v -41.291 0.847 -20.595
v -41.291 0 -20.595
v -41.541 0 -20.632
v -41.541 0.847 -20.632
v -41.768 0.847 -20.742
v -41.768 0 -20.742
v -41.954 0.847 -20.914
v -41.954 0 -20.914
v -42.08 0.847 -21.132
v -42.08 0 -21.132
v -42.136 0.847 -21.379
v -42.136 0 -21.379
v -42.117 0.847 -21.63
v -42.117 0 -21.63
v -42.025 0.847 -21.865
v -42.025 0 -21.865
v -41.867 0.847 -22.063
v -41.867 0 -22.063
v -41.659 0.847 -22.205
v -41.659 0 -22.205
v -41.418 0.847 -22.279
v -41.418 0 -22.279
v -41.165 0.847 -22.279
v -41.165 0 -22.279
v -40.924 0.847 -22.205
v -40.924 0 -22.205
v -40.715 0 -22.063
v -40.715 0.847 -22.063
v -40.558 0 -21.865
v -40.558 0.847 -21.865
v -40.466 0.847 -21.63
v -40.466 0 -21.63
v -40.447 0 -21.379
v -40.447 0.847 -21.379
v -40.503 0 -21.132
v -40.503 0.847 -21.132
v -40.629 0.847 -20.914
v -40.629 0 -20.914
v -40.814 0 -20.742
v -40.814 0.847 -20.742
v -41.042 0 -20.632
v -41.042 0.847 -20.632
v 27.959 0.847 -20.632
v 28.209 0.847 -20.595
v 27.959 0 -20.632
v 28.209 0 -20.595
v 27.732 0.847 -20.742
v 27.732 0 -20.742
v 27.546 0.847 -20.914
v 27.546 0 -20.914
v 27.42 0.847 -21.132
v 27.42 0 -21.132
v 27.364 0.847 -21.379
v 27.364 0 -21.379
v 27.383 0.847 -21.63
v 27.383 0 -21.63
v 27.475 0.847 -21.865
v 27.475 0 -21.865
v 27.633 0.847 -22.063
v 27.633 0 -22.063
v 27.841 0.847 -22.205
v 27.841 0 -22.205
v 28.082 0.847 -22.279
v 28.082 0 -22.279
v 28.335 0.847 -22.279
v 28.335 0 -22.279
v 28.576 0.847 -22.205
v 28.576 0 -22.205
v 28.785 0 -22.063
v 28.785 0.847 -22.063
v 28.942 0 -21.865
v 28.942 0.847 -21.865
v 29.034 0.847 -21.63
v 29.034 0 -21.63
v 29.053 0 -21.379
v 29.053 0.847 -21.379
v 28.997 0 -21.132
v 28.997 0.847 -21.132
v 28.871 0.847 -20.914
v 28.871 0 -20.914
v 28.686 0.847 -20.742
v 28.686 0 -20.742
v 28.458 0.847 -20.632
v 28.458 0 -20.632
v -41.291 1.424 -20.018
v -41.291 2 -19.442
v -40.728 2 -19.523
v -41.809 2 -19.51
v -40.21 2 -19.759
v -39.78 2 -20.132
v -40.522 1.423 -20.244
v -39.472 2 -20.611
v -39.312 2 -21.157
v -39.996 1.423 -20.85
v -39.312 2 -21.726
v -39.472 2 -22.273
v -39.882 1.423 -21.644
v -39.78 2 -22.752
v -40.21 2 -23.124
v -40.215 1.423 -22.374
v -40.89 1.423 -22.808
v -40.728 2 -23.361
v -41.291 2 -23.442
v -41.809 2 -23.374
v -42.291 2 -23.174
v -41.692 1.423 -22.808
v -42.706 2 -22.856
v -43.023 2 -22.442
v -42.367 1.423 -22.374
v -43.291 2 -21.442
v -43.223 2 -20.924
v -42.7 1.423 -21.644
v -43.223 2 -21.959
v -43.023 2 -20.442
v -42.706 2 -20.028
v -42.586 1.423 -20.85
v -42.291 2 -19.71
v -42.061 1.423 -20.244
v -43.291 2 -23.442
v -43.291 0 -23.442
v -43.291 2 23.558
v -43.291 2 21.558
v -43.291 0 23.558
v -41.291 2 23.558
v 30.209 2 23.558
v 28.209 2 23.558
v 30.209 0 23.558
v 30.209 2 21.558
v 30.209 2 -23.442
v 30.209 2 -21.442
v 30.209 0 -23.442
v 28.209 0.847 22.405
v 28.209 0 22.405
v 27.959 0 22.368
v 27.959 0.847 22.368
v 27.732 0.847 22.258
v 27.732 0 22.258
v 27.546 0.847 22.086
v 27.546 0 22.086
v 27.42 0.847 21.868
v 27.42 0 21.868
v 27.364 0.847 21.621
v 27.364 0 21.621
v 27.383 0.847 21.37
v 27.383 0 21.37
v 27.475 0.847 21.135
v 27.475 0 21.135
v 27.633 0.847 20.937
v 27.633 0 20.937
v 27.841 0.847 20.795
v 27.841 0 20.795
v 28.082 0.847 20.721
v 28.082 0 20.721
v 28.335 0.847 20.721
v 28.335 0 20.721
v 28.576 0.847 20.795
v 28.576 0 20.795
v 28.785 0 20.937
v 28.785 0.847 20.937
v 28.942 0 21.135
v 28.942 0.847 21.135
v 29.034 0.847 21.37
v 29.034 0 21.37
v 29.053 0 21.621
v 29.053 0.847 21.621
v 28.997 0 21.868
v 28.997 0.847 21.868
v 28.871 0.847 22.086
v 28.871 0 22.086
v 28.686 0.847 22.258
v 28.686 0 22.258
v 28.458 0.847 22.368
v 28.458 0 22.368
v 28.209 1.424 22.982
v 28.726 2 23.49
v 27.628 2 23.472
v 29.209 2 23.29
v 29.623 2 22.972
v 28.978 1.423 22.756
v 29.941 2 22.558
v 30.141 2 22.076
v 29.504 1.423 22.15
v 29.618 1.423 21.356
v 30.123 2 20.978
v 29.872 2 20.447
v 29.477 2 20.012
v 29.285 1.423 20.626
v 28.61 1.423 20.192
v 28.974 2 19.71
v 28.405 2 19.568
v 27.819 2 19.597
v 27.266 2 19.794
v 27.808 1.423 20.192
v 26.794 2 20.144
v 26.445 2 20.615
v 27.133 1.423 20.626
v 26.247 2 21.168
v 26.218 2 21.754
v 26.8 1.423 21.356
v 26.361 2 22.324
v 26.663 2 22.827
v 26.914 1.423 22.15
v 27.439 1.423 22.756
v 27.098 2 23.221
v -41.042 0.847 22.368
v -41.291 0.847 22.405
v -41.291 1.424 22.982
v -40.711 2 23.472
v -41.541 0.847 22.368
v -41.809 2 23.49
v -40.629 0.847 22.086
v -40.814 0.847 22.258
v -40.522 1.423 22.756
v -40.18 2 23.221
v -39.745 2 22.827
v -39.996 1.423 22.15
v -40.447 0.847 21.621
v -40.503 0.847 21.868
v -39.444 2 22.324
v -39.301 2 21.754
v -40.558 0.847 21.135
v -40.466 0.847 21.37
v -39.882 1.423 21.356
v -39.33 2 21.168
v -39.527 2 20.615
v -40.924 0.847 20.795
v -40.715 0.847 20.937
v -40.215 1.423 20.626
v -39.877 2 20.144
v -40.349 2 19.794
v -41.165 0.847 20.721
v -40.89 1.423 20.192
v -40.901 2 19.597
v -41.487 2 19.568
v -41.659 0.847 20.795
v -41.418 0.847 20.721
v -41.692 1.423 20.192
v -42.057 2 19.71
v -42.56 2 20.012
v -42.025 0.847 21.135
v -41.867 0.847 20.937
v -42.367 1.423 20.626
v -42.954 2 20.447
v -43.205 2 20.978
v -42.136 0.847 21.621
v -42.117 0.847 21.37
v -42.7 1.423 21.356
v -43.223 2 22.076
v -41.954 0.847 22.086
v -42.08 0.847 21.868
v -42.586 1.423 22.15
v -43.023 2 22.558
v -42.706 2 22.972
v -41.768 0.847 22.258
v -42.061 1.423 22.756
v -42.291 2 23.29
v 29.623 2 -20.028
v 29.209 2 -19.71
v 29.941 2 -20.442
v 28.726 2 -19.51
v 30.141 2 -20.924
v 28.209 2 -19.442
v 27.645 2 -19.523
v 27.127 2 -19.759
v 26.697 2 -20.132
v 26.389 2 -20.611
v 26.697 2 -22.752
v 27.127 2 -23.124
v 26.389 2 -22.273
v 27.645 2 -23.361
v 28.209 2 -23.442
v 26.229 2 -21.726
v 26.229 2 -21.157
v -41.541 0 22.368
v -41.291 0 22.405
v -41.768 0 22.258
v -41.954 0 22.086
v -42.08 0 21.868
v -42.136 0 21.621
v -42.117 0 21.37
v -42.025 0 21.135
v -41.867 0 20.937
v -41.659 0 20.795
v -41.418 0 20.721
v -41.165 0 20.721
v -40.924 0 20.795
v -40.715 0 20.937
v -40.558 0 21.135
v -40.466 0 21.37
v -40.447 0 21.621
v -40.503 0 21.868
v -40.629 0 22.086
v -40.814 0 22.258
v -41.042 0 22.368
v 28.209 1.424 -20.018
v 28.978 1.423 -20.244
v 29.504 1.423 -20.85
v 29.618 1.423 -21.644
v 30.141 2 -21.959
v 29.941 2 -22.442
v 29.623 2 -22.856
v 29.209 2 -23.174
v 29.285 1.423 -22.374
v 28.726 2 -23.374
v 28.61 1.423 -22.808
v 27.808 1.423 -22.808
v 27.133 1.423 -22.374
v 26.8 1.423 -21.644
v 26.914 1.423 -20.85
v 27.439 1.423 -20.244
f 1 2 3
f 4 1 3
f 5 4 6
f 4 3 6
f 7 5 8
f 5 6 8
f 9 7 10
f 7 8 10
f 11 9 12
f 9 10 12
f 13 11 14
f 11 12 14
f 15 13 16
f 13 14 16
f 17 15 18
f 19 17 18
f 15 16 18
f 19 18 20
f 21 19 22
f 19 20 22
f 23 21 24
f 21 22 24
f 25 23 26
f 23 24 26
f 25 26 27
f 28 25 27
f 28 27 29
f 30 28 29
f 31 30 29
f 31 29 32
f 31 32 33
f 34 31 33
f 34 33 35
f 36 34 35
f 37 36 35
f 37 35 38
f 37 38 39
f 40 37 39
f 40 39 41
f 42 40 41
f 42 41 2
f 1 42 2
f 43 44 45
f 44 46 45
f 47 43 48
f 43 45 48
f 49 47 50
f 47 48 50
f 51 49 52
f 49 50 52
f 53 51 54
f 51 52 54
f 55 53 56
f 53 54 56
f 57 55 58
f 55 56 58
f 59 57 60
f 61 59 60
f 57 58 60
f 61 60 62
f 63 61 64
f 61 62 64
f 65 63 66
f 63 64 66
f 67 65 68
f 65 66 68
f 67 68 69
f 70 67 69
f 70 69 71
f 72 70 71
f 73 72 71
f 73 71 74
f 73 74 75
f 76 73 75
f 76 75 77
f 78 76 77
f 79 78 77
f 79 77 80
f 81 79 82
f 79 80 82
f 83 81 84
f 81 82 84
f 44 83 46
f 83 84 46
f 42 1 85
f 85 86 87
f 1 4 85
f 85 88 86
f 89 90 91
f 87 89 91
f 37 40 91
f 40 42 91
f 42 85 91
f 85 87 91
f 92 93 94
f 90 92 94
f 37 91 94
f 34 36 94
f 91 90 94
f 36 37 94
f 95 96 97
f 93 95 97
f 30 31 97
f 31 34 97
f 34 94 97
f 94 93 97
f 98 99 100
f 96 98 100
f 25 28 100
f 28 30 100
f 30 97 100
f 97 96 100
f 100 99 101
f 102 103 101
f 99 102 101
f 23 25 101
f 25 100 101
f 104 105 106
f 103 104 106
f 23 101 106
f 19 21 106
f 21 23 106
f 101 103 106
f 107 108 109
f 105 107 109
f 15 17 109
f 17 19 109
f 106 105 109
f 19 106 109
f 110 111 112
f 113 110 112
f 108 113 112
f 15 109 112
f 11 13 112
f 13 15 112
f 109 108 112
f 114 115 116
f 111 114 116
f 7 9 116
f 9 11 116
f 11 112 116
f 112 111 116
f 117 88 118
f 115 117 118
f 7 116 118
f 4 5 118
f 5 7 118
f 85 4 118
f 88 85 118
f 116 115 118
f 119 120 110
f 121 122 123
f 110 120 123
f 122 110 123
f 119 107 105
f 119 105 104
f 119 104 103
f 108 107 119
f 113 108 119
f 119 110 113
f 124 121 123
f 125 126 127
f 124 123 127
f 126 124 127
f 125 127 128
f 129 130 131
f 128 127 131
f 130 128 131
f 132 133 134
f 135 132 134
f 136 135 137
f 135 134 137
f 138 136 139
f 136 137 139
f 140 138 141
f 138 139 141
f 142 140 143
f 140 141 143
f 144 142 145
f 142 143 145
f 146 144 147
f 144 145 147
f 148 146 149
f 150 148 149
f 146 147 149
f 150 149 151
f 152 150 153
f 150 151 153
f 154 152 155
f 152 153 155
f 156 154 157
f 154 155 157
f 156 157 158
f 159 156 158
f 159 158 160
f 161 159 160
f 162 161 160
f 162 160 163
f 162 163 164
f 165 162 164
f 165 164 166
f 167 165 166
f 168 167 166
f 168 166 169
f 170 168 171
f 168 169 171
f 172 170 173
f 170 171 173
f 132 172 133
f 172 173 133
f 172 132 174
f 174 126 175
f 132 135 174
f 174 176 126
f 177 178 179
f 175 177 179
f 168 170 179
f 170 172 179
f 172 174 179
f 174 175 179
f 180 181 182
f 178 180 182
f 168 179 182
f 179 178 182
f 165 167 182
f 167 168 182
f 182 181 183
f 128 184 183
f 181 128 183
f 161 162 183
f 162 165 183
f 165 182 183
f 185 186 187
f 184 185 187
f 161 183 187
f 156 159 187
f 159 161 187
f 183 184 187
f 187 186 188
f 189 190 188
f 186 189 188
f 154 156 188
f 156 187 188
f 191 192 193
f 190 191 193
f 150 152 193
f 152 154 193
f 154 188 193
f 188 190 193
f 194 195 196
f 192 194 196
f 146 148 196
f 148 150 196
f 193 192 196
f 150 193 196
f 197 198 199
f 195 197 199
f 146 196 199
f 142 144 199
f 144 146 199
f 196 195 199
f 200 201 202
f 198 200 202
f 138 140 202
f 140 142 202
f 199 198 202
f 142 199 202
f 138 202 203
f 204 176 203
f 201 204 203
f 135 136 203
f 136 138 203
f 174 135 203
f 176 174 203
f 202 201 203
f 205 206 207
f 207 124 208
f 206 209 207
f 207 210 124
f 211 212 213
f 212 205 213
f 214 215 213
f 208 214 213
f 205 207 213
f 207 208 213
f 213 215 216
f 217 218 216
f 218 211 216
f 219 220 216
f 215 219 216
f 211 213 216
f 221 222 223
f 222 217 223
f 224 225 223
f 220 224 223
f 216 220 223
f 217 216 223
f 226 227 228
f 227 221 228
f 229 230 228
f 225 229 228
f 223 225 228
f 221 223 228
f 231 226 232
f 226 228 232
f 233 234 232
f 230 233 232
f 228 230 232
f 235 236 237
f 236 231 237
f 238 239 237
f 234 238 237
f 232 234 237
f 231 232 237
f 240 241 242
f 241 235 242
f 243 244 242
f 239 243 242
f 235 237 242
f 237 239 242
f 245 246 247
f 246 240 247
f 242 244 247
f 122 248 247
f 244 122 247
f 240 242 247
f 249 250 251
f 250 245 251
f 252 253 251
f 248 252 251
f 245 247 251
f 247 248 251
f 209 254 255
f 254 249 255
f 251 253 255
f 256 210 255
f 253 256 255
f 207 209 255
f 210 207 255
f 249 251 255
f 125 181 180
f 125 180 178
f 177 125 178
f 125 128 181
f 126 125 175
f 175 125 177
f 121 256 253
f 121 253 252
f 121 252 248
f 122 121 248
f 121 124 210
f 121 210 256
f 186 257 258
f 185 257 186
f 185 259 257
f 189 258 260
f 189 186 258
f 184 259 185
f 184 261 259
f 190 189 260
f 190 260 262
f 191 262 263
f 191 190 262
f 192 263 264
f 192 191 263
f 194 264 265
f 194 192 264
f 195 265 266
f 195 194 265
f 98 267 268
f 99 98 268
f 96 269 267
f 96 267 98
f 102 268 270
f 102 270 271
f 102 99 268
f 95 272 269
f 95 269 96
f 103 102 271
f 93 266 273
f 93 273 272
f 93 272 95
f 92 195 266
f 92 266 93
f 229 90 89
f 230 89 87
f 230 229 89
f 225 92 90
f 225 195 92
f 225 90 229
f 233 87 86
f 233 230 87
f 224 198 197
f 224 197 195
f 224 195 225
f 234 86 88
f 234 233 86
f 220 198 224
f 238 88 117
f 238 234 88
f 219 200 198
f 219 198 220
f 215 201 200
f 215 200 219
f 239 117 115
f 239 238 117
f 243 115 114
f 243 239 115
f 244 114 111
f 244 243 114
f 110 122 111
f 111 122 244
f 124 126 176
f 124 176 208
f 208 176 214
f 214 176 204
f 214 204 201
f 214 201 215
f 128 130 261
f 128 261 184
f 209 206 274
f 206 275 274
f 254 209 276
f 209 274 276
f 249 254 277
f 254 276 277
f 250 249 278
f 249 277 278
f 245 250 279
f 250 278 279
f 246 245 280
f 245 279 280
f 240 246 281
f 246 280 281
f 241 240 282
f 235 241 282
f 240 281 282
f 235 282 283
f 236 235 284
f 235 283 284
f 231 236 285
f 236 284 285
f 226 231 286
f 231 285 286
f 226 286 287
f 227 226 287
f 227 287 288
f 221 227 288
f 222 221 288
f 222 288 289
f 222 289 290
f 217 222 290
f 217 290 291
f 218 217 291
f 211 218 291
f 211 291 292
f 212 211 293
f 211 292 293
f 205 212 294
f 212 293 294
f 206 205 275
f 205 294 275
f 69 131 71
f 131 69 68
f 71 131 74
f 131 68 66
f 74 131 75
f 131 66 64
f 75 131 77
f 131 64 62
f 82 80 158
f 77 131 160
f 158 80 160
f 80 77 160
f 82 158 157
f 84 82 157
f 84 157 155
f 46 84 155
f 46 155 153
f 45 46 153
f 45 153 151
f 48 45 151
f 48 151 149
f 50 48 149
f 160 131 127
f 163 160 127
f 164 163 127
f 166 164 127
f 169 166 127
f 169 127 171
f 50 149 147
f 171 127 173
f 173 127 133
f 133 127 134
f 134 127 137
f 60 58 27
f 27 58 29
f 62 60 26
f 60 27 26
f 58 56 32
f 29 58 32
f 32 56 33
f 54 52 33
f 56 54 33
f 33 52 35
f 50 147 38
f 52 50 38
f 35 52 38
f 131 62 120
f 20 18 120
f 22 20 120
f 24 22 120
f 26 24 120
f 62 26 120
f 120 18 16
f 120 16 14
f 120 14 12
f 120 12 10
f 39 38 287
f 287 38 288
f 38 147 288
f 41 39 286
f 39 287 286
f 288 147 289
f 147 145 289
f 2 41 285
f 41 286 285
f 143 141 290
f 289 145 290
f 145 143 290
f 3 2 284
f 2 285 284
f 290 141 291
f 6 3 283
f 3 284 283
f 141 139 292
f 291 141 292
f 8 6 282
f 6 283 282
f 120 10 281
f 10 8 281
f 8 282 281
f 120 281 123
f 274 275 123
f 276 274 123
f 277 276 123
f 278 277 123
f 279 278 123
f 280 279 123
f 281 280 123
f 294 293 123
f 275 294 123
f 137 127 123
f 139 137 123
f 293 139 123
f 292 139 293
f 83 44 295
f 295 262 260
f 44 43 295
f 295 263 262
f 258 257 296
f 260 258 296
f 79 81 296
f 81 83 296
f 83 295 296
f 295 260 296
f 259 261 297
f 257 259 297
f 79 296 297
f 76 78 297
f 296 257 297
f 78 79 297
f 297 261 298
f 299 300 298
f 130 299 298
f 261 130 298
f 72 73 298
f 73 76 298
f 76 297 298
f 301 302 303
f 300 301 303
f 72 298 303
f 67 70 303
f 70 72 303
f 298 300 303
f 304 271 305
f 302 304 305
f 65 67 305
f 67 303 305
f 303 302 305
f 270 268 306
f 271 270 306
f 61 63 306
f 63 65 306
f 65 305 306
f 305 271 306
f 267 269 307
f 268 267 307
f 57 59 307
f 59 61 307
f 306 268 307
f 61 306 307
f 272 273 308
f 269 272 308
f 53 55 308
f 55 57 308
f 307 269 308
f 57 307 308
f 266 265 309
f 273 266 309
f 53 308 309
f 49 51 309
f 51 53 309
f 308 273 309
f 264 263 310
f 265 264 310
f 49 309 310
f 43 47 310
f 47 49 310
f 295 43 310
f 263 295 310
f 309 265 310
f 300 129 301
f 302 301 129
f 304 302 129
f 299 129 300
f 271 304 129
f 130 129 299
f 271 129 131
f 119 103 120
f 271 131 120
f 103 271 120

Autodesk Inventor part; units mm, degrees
ref_plane "YZ Plane" through (0, 0, 0) normal (1, 0, 0) x (0, 1, 0)
ref_plane "XZ Plane" through (0, 0, 0) normal (0, 1, 0) x (-1, 0, 0)
ref_plane "XY Plane" through (0, 0, 0) normal (0, 0, 1) x (1, 0, 0)
sketch "Sketch1" plane through (0, 0, 0) normal (0, 1, 0) x (-1, 0, 0)
  line L0 (43.2913, 23.5582) -> (-30.2087, 23.5582)
  line L1 (-30.2087, 23.5582) -> (-30.2087, -23.4418)
  line L2 (-30.2087, -23.4418) -> (43.2913, -23.4418)
  line L3 (43.2913, -23.4418) -> (43.2913, 23.5582)
  point P0 (0, 0)
  dimension "d0" = 47
  dimension "d1" = 73.5
extrude "Extrusion1" add sketch "Sketch1" along normal blind 2
sketch "Sketch2" plane through (0, 2, 0) normal (0, 1, 0) x (1, 0, 0)
  circle A0 centre (-41.2913, -21.5582) radius 0.8353
  line L0 (-43.2913, -23.5582) -> (30.2087, -23.5582) projected
  line L1 (-43.2913, 23.4418) -> (-43.2913, -23.5582) projected
  point P0 (0, 0)
  dimension "d4" = 2
  dimension "d5" = 2
hole "Hole1" at (-41.2913, 2, 21.5582) direction (0, -1, 0) diameter 1.694 depth 2 countersink diameter 4 countersink angle 90 thread size "2-56 UNC" class "2B" standard "ANSI Unified Screw Threads"
pattern_linear "Rectangular Pattern1" count 2 spacing 43 along (0, 0, -1) count 2 spacing 69.5 along (1, 0, 0) of "Hole1"
properties part number "BoxLid"
